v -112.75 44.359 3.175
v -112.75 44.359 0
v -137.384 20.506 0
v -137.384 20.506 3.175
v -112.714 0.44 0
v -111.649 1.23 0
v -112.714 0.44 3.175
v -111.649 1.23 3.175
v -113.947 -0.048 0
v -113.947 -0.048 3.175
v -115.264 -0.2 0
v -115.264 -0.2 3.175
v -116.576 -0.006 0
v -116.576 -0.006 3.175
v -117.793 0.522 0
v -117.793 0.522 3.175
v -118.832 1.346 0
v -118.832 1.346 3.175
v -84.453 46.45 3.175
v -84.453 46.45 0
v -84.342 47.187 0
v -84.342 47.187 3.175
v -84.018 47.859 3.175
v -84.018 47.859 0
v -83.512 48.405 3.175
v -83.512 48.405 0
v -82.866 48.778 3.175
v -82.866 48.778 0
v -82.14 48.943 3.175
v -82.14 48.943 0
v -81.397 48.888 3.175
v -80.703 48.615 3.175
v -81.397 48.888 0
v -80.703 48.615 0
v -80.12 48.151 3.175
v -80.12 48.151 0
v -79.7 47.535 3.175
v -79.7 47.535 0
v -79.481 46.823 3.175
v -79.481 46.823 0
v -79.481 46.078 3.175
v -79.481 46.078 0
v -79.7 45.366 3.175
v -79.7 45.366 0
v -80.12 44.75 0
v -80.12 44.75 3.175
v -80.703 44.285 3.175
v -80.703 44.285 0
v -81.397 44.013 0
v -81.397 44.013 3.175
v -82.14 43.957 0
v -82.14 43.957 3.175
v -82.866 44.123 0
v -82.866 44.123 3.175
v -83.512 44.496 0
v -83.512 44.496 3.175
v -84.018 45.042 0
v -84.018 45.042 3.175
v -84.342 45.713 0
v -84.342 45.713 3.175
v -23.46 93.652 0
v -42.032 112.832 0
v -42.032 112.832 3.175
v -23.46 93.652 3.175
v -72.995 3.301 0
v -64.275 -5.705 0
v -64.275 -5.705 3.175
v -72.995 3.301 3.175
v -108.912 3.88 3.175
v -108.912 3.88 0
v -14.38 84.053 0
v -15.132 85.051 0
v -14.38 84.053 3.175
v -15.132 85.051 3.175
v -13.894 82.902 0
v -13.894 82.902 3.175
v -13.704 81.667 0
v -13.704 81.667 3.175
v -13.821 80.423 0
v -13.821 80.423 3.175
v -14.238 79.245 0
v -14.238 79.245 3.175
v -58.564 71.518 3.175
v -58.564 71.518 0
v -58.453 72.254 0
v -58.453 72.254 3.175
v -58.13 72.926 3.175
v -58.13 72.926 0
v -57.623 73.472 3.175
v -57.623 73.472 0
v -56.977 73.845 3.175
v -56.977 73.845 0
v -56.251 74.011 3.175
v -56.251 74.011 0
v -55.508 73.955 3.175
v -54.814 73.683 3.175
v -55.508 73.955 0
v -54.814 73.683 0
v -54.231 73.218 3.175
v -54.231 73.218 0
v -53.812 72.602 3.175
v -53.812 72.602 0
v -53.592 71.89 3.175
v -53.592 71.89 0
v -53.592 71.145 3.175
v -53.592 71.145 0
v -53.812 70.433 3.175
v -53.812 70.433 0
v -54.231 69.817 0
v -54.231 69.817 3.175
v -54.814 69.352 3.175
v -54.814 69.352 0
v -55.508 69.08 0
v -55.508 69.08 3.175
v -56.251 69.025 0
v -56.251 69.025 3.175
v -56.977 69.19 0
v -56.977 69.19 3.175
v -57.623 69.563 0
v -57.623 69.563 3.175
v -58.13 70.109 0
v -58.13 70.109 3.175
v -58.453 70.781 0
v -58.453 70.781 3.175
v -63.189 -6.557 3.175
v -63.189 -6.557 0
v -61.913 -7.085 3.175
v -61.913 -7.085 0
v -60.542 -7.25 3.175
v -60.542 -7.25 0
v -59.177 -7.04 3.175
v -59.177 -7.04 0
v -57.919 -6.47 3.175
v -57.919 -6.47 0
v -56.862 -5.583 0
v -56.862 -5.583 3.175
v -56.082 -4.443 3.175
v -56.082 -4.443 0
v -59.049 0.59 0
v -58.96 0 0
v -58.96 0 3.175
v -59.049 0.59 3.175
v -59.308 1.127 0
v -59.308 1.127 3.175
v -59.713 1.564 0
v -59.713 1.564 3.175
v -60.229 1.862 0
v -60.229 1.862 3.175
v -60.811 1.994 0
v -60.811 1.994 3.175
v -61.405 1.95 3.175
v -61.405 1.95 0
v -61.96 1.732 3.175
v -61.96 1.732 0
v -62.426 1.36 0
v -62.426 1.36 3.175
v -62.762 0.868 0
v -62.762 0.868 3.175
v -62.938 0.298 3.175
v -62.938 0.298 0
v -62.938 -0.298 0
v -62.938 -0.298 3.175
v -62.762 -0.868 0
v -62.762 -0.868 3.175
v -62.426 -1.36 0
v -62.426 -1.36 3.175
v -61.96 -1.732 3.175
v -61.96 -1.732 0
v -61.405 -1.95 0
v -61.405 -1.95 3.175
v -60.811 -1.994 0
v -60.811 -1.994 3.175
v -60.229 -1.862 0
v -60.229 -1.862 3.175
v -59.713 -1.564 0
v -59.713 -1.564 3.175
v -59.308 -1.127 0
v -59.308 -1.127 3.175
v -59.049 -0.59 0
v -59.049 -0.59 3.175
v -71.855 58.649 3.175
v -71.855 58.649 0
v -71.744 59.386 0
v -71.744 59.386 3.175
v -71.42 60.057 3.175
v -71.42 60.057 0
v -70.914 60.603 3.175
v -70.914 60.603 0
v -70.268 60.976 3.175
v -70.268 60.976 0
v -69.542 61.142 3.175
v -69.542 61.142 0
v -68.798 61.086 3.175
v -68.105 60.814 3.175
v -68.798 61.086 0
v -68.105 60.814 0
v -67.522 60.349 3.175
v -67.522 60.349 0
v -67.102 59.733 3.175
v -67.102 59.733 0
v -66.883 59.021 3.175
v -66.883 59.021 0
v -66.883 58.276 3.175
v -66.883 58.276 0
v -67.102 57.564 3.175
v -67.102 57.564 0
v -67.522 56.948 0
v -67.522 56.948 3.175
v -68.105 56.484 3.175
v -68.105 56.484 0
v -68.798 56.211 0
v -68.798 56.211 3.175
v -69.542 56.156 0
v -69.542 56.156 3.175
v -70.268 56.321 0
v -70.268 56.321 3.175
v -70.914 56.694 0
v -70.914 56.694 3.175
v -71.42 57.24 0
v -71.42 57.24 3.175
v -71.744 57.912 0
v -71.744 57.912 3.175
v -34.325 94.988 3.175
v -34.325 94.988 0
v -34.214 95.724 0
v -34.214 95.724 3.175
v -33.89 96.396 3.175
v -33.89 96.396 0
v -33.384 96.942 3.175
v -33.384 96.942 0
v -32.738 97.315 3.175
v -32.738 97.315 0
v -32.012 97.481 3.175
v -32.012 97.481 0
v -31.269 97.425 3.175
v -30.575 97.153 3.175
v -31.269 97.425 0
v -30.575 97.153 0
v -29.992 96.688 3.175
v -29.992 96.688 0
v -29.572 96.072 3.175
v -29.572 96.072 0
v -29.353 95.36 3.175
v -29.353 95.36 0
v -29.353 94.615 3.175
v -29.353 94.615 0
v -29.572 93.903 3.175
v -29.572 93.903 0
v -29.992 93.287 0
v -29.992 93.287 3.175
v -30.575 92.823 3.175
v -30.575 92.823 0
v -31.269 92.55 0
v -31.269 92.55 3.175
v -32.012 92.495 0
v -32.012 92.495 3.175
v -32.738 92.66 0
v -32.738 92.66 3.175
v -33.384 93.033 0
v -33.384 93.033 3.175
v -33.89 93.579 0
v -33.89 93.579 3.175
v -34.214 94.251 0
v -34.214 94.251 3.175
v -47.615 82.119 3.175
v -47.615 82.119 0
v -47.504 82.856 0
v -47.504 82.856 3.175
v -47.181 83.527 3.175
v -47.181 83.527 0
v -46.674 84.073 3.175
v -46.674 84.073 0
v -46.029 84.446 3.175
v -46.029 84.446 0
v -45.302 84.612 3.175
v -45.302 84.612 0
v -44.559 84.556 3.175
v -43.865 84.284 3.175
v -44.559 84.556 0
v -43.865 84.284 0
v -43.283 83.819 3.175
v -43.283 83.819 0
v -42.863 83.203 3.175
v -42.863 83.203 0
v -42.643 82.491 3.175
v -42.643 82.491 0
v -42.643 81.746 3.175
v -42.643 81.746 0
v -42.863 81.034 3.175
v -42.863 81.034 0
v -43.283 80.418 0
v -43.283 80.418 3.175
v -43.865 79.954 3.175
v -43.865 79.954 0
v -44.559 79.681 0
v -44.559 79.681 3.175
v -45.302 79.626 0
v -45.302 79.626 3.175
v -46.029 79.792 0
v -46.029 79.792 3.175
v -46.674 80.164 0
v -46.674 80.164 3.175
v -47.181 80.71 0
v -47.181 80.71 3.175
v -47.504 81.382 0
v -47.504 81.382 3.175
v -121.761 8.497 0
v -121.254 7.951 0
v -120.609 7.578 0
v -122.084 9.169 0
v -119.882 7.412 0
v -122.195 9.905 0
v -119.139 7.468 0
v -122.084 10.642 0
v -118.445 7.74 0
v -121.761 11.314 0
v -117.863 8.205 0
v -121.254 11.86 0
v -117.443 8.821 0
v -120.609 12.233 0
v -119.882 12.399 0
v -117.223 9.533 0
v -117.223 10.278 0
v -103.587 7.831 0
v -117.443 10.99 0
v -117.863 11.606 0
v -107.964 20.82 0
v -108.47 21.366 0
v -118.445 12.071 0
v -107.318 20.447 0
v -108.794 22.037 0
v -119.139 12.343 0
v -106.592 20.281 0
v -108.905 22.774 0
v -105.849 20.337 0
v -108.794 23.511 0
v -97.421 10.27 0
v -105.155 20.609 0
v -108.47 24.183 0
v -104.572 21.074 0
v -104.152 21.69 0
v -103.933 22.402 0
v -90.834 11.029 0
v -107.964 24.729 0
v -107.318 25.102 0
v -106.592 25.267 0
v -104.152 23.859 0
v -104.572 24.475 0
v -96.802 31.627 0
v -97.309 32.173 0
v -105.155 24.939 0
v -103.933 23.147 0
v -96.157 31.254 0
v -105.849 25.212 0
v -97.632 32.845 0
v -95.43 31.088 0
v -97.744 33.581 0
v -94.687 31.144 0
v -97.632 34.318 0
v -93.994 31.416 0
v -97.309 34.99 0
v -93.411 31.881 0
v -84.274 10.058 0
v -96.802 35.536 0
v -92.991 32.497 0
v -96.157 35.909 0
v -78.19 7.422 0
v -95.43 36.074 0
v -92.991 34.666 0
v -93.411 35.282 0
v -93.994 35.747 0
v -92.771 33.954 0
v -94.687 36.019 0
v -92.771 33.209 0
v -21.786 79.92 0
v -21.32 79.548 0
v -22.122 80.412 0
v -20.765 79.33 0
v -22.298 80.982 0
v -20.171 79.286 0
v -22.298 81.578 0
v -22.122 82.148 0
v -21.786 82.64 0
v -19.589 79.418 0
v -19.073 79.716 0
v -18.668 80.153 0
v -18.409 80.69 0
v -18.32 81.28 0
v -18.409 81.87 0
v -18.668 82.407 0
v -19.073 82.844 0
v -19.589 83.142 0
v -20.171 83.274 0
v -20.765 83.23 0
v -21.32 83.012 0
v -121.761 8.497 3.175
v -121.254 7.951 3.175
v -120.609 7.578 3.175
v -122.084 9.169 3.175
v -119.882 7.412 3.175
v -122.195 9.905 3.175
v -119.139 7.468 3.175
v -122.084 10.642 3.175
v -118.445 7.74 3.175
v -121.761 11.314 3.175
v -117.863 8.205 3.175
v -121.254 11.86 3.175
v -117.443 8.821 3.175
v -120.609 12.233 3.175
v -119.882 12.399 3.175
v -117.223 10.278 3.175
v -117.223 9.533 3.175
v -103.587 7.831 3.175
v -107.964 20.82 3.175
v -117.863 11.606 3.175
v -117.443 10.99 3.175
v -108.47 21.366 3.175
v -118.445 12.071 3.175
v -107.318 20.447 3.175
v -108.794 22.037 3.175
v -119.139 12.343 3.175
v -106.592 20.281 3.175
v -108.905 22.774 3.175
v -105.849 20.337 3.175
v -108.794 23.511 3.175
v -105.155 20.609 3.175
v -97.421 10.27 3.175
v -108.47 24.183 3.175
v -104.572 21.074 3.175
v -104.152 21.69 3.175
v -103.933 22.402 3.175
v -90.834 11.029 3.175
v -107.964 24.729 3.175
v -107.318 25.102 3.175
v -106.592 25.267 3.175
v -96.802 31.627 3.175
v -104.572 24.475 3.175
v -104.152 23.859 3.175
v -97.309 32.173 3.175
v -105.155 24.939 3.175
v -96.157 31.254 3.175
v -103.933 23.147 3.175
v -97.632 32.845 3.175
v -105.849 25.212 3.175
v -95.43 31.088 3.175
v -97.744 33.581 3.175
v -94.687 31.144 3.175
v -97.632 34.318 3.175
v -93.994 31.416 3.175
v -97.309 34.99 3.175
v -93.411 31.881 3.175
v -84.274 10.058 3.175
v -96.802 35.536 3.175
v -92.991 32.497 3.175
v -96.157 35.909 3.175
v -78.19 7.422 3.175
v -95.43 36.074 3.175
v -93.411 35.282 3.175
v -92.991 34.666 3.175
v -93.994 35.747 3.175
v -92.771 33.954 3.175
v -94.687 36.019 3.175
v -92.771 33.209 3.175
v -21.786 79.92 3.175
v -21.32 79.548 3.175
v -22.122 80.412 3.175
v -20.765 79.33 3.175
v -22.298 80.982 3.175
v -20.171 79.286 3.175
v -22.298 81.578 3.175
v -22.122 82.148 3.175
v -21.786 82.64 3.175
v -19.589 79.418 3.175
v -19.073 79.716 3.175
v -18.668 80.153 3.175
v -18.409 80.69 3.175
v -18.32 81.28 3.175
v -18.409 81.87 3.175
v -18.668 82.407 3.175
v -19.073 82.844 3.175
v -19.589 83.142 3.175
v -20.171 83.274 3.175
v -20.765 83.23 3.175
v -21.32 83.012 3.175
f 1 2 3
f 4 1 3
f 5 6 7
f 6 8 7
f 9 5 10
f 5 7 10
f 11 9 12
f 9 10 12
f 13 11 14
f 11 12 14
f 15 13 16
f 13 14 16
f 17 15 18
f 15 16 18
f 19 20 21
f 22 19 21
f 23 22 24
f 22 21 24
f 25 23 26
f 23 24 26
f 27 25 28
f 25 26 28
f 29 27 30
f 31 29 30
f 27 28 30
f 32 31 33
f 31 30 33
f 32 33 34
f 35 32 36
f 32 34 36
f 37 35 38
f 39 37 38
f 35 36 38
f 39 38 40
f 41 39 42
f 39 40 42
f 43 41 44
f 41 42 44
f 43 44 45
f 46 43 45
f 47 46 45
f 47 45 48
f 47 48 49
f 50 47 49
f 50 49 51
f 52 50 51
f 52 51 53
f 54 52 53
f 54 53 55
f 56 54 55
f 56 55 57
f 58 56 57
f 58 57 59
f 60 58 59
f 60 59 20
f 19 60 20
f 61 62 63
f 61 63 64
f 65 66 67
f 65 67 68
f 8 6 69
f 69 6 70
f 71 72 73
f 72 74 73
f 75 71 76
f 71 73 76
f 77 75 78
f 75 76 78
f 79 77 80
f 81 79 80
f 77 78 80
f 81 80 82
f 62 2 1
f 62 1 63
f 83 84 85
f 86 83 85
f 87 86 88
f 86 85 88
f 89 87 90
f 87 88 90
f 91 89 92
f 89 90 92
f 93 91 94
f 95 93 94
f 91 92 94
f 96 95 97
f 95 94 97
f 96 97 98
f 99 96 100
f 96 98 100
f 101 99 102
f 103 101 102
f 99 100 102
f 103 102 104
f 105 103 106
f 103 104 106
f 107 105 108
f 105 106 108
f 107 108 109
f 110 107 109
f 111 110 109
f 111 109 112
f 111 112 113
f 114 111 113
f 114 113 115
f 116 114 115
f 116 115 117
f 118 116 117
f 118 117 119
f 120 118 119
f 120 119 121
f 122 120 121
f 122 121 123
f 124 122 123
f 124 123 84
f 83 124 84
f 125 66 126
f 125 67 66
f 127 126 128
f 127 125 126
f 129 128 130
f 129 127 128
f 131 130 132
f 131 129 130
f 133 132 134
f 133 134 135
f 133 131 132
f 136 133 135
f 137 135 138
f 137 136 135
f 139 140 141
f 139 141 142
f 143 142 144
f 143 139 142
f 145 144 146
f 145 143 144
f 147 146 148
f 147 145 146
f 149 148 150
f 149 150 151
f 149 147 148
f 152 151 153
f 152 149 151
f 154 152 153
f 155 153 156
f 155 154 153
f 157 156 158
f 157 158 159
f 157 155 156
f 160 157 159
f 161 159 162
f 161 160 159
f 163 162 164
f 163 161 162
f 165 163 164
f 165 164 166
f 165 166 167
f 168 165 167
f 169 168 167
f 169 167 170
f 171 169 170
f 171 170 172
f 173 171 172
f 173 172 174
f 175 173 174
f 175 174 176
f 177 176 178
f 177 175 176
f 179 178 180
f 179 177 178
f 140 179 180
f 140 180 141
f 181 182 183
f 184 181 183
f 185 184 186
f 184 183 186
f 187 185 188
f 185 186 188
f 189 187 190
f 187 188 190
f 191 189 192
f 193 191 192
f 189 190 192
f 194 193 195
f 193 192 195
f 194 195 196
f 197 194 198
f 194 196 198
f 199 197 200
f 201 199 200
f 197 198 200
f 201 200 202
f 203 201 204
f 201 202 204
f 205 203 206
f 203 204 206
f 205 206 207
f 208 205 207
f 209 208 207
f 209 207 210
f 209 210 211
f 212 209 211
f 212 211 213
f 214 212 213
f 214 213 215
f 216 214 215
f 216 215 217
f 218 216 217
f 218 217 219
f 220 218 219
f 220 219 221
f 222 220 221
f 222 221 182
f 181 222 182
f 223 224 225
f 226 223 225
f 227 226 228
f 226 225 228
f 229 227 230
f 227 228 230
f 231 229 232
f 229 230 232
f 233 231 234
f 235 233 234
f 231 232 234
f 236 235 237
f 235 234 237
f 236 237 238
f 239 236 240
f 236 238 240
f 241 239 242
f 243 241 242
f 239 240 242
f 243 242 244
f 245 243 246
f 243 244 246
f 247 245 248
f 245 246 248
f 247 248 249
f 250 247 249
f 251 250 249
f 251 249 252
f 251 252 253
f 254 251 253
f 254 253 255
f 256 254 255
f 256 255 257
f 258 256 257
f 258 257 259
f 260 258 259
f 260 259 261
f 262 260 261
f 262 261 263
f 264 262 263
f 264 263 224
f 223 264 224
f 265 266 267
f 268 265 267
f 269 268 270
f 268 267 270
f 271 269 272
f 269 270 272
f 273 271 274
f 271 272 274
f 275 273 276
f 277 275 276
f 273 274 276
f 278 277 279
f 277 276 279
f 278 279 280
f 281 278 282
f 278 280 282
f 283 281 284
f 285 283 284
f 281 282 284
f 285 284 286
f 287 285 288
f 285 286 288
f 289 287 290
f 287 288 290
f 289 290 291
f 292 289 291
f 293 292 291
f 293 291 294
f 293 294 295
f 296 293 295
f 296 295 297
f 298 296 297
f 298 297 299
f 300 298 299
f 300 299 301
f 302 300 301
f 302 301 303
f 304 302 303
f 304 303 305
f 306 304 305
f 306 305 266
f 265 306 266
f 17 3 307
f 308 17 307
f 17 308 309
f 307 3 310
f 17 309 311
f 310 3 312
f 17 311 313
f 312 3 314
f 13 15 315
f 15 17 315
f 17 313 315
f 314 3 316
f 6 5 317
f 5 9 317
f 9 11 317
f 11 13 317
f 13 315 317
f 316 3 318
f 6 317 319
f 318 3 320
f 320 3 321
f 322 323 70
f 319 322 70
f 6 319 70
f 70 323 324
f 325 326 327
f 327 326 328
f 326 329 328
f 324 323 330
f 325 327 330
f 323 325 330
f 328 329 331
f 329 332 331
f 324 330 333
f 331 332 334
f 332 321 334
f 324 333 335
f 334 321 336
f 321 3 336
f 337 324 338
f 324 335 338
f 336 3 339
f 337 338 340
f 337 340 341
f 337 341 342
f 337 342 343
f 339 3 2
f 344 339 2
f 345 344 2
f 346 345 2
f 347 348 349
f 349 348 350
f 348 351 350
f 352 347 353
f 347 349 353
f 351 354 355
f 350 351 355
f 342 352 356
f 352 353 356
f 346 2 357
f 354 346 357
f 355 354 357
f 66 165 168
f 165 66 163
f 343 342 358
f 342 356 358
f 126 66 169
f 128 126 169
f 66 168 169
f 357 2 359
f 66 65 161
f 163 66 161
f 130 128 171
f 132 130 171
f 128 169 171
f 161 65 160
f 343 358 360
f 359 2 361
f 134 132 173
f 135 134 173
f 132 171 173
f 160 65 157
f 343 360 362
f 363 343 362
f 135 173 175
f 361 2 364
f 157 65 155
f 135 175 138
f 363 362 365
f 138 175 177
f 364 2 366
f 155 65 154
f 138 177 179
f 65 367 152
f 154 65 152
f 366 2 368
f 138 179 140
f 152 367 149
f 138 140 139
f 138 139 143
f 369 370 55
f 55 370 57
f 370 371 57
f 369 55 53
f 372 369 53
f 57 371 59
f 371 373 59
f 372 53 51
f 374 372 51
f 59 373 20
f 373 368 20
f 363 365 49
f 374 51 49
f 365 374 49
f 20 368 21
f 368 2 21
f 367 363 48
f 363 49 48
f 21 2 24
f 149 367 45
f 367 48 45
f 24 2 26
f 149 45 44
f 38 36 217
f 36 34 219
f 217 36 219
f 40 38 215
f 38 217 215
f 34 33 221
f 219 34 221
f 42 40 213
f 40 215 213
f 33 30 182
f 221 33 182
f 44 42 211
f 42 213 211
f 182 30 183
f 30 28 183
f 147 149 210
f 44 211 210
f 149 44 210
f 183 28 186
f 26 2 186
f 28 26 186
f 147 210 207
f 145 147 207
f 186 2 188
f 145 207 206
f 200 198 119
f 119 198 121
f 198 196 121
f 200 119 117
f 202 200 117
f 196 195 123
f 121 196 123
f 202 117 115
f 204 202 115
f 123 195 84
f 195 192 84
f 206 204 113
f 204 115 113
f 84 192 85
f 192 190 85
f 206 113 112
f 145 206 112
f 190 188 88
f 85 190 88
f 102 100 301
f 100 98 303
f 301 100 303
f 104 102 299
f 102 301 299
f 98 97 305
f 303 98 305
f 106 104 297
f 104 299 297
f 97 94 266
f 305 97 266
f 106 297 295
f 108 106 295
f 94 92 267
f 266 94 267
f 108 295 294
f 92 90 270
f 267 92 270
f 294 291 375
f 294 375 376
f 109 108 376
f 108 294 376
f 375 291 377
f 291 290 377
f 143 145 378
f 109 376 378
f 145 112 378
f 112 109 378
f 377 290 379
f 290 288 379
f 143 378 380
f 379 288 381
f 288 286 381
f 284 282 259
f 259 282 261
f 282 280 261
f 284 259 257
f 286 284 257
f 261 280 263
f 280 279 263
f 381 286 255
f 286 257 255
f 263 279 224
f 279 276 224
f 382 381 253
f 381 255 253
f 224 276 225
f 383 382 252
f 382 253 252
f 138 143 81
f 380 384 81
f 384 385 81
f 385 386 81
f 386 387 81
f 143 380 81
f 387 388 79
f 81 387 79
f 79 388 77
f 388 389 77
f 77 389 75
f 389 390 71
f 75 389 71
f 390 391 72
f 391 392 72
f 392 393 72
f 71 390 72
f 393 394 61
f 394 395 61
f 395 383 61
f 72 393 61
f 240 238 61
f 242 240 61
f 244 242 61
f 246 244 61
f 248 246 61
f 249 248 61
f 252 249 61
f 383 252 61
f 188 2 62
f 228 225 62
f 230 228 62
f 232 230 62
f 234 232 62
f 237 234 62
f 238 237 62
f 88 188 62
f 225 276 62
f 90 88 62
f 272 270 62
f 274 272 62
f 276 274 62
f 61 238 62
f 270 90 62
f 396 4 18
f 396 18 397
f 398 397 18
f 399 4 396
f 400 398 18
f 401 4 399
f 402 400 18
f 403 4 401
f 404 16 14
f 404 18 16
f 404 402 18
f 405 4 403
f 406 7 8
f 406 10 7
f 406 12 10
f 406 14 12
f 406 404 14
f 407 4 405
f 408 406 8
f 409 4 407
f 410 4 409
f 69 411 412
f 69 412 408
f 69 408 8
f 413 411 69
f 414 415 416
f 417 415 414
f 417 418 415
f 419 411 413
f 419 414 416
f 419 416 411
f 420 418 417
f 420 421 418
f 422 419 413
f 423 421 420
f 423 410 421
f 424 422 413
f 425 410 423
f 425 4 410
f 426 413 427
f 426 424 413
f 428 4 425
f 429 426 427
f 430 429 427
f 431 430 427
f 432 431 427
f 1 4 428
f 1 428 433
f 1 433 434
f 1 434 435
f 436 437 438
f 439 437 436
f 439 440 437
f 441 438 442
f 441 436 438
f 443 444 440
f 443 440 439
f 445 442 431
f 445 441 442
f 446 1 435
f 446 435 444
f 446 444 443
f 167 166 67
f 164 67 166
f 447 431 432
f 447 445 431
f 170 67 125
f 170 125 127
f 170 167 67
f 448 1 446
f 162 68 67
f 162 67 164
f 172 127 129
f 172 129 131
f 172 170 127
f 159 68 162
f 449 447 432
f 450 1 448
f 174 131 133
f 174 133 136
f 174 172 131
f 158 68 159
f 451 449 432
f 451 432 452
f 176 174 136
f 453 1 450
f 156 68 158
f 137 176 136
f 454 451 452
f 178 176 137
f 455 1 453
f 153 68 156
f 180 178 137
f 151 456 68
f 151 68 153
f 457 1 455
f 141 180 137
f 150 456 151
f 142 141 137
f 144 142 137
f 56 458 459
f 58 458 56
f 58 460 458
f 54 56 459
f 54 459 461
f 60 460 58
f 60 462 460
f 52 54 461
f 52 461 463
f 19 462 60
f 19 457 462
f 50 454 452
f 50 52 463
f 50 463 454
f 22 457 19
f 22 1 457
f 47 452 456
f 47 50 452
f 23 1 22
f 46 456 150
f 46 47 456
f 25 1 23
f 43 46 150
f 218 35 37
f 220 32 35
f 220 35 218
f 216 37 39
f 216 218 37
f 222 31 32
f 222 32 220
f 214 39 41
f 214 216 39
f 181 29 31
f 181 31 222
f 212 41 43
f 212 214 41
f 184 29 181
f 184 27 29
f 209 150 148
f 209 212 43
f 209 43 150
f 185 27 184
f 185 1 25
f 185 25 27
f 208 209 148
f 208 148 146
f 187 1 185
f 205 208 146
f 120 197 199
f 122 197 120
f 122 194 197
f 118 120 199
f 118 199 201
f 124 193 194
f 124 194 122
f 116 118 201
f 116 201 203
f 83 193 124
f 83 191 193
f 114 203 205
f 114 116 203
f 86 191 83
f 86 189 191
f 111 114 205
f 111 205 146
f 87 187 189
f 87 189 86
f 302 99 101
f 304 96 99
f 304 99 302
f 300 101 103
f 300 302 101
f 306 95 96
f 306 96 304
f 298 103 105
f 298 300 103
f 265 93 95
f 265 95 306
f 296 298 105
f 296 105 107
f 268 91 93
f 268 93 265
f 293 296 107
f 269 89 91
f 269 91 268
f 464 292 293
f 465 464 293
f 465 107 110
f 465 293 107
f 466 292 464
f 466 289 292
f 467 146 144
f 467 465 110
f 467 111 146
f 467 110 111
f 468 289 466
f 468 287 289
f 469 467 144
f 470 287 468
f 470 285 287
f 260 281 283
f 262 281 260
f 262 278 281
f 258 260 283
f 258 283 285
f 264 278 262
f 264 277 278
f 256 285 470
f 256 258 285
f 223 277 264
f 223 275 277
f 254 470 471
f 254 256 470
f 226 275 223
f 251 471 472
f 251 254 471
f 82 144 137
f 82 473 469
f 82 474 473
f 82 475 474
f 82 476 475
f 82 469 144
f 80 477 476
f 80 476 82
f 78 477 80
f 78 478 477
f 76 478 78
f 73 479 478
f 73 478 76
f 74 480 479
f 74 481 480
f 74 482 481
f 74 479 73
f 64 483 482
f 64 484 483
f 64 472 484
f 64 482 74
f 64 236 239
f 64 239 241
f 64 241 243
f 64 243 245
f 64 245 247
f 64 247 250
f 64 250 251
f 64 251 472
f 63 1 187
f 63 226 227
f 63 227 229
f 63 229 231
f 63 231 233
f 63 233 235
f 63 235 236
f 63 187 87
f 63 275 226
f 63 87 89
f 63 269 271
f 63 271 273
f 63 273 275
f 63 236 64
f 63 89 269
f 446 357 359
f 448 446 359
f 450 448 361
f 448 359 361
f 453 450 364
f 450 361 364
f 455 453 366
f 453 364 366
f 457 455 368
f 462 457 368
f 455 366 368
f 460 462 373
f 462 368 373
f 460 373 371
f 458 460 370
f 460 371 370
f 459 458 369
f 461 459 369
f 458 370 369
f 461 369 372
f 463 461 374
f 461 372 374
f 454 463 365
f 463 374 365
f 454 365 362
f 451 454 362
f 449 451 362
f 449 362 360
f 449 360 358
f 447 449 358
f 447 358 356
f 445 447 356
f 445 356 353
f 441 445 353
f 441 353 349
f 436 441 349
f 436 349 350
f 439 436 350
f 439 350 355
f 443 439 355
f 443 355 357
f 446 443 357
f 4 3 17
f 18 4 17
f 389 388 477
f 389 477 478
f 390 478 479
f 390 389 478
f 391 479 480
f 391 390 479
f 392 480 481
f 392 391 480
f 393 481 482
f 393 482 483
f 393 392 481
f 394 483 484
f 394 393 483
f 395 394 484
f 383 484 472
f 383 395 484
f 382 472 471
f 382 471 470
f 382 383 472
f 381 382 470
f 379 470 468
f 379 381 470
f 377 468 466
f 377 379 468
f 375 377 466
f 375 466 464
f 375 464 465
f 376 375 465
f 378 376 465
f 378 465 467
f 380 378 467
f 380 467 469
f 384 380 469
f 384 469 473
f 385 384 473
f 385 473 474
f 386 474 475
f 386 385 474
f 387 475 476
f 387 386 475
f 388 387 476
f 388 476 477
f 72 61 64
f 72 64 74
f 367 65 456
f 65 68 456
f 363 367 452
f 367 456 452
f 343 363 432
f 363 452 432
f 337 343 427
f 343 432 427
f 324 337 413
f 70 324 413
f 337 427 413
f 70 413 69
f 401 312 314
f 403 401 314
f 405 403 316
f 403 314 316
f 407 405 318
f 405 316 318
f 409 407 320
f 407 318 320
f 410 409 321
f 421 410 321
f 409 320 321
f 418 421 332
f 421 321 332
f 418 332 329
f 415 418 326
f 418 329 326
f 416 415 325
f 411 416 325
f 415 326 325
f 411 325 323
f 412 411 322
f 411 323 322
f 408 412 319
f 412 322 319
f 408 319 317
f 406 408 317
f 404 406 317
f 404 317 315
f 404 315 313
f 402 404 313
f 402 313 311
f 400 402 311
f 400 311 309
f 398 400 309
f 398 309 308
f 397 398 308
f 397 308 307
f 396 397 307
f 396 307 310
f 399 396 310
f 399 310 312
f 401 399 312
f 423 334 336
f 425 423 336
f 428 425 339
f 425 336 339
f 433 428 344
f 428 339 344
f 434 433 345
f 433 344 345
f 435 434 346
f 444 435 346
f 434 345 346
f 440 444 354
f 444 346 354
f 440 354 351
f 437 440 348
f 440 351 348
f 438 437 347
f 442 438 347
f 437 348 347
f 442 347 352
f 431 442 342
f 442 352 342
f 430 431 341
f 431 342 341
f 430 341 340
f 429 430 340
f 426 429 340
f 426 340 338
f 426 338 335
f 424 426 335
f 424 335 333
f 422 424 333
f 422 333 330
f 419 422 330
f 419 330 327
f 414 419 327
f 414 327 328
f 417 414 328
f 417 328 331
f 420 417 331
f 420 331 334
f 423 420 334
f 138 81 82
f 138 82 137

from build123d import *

# Parameters (mm, degrees)
SKETCH1_R           = 2
BOSS_EXTRUDE3_DEPTH = 3.175
SKETCH2_R           = 2.5
CUT_EXTRUDE1_DEPTH  = 4.175
BOSS_EXTRUDE4_DEPTH = 3.175
SKETCH4_R           = 2.5
CUT_EXTRUDE2_DEPTH  = 4.175
FILLET2_R           = 5.08
FILLET3_R           = 25.4
FILLET4_R           = 5.08


with BuildPart() as part:
    # Sketch1 → Boss-Extrude3 (new body)
    with BuildSketch(Plane.XY):
        Polygon((-12.628154113, 82.464660116), (-59.28812357, -10.855278797), (-112.74974727, 44.358551699), (-42.031929204, 112.83214508), (-23.460387201, 93.651920065), align=None)
        with Locations((-20.32, 81.28)):
            Circle(SKETCH1_R, mode=Mode.SUBTRACT)
        with Locations((-60.96, 0)):
            Circle(SKETCH1_R, mode=Mode.SUBTRACT)
    extrude(amount=BOSS_EXTRUDE3_DEPTH)

    # Sketch2 → Cut-Extrude1 (cut, through all)
    with BuildSketch(Plane(origin=(0, 0, 0), x_dir=(-1, 0, 0), z_dir=(0, 0, -1))):
        with Locations((95.243542319, 33.581465441)):
            Circle(SKETCH2_R)
        with Locations((31.824813554, 94.987605576)):
            Circle(SKETCH2_R)
        with Locations((81.952877746, 46.450351765)):
            Circle(SKETCH2_R)
        with Locations((45.115478127, 82.118719252)):
            Circle(SKETCH2_R)
        with Locations((56.064112078, 71.517539384)):
            Circle(SKETCH2_R)
        with Locations((69.354776651, 58.64865306)):
            Circle(SKETCH2_R)
    extrude(amount=-CUT_EXTRUDE1_DEPTH, mode=Mode.SUBTRACT)

    # Sketch3 → Boss-Extrude4 (add)
    with BuildSketch(Plane(origin=(0, 0, 0), x_dir=(-1, 0, 0), z_dir=(0, 0, -1))):
        Polygon((112.74974727, 44.358551699), (137.38417366, 20.505896995), (115.298382267, -2.30375707), (90.663955877, 21.548897635), align=None)
    extrude(amount=-BOSS_EXTRUDE4_DEPTH)

    # Sketch4 → Cut-Extrude2 (cut, through all)
    with BuildSketch(Plane(origin=(0, 0, 0), x_dir=(-1, 0, 0), z_dir=(0, 0, -1))):
        with Locations((106.404826903, 22.774383392)):
            Circle(SKETCH4_R)
        with Locations((119.695491476, 9.905497068)):
            Circle(SKETCH4_R)
    extrude(amount=-CUT_EXTRUDE2_DEPTH, mode=Mode.SUBTRACT)

    # Fillet2
    fillet2_edges = [part.edges().sort_by_distance(p)[0] for p in [
        (-59.28812357, -10.855278797, 1.5875),
        (-12.628154113, 82.464660116, 1.5875),
    ]]
    fillet(fillet2_edges, radius=FILLET2_R)

    # Fillet3
    fillet3_edges = [part.edges().sort_by_distance(p)[0] for p in [
        (-90.663955877, 21.548897635, 1.5875),
    ]]
    fillet(fillet3_edges, radius=FILLET3_R)

    # Fillet4
    fillet4_edges = [part.edges().sort_by_distance(p)[0] for p in [
        (-115.298382267, -2.30375707, 1.5875),
    ]]
    fillet(fillet4_edges, radius=FILLET4_R)


solid = part.part
